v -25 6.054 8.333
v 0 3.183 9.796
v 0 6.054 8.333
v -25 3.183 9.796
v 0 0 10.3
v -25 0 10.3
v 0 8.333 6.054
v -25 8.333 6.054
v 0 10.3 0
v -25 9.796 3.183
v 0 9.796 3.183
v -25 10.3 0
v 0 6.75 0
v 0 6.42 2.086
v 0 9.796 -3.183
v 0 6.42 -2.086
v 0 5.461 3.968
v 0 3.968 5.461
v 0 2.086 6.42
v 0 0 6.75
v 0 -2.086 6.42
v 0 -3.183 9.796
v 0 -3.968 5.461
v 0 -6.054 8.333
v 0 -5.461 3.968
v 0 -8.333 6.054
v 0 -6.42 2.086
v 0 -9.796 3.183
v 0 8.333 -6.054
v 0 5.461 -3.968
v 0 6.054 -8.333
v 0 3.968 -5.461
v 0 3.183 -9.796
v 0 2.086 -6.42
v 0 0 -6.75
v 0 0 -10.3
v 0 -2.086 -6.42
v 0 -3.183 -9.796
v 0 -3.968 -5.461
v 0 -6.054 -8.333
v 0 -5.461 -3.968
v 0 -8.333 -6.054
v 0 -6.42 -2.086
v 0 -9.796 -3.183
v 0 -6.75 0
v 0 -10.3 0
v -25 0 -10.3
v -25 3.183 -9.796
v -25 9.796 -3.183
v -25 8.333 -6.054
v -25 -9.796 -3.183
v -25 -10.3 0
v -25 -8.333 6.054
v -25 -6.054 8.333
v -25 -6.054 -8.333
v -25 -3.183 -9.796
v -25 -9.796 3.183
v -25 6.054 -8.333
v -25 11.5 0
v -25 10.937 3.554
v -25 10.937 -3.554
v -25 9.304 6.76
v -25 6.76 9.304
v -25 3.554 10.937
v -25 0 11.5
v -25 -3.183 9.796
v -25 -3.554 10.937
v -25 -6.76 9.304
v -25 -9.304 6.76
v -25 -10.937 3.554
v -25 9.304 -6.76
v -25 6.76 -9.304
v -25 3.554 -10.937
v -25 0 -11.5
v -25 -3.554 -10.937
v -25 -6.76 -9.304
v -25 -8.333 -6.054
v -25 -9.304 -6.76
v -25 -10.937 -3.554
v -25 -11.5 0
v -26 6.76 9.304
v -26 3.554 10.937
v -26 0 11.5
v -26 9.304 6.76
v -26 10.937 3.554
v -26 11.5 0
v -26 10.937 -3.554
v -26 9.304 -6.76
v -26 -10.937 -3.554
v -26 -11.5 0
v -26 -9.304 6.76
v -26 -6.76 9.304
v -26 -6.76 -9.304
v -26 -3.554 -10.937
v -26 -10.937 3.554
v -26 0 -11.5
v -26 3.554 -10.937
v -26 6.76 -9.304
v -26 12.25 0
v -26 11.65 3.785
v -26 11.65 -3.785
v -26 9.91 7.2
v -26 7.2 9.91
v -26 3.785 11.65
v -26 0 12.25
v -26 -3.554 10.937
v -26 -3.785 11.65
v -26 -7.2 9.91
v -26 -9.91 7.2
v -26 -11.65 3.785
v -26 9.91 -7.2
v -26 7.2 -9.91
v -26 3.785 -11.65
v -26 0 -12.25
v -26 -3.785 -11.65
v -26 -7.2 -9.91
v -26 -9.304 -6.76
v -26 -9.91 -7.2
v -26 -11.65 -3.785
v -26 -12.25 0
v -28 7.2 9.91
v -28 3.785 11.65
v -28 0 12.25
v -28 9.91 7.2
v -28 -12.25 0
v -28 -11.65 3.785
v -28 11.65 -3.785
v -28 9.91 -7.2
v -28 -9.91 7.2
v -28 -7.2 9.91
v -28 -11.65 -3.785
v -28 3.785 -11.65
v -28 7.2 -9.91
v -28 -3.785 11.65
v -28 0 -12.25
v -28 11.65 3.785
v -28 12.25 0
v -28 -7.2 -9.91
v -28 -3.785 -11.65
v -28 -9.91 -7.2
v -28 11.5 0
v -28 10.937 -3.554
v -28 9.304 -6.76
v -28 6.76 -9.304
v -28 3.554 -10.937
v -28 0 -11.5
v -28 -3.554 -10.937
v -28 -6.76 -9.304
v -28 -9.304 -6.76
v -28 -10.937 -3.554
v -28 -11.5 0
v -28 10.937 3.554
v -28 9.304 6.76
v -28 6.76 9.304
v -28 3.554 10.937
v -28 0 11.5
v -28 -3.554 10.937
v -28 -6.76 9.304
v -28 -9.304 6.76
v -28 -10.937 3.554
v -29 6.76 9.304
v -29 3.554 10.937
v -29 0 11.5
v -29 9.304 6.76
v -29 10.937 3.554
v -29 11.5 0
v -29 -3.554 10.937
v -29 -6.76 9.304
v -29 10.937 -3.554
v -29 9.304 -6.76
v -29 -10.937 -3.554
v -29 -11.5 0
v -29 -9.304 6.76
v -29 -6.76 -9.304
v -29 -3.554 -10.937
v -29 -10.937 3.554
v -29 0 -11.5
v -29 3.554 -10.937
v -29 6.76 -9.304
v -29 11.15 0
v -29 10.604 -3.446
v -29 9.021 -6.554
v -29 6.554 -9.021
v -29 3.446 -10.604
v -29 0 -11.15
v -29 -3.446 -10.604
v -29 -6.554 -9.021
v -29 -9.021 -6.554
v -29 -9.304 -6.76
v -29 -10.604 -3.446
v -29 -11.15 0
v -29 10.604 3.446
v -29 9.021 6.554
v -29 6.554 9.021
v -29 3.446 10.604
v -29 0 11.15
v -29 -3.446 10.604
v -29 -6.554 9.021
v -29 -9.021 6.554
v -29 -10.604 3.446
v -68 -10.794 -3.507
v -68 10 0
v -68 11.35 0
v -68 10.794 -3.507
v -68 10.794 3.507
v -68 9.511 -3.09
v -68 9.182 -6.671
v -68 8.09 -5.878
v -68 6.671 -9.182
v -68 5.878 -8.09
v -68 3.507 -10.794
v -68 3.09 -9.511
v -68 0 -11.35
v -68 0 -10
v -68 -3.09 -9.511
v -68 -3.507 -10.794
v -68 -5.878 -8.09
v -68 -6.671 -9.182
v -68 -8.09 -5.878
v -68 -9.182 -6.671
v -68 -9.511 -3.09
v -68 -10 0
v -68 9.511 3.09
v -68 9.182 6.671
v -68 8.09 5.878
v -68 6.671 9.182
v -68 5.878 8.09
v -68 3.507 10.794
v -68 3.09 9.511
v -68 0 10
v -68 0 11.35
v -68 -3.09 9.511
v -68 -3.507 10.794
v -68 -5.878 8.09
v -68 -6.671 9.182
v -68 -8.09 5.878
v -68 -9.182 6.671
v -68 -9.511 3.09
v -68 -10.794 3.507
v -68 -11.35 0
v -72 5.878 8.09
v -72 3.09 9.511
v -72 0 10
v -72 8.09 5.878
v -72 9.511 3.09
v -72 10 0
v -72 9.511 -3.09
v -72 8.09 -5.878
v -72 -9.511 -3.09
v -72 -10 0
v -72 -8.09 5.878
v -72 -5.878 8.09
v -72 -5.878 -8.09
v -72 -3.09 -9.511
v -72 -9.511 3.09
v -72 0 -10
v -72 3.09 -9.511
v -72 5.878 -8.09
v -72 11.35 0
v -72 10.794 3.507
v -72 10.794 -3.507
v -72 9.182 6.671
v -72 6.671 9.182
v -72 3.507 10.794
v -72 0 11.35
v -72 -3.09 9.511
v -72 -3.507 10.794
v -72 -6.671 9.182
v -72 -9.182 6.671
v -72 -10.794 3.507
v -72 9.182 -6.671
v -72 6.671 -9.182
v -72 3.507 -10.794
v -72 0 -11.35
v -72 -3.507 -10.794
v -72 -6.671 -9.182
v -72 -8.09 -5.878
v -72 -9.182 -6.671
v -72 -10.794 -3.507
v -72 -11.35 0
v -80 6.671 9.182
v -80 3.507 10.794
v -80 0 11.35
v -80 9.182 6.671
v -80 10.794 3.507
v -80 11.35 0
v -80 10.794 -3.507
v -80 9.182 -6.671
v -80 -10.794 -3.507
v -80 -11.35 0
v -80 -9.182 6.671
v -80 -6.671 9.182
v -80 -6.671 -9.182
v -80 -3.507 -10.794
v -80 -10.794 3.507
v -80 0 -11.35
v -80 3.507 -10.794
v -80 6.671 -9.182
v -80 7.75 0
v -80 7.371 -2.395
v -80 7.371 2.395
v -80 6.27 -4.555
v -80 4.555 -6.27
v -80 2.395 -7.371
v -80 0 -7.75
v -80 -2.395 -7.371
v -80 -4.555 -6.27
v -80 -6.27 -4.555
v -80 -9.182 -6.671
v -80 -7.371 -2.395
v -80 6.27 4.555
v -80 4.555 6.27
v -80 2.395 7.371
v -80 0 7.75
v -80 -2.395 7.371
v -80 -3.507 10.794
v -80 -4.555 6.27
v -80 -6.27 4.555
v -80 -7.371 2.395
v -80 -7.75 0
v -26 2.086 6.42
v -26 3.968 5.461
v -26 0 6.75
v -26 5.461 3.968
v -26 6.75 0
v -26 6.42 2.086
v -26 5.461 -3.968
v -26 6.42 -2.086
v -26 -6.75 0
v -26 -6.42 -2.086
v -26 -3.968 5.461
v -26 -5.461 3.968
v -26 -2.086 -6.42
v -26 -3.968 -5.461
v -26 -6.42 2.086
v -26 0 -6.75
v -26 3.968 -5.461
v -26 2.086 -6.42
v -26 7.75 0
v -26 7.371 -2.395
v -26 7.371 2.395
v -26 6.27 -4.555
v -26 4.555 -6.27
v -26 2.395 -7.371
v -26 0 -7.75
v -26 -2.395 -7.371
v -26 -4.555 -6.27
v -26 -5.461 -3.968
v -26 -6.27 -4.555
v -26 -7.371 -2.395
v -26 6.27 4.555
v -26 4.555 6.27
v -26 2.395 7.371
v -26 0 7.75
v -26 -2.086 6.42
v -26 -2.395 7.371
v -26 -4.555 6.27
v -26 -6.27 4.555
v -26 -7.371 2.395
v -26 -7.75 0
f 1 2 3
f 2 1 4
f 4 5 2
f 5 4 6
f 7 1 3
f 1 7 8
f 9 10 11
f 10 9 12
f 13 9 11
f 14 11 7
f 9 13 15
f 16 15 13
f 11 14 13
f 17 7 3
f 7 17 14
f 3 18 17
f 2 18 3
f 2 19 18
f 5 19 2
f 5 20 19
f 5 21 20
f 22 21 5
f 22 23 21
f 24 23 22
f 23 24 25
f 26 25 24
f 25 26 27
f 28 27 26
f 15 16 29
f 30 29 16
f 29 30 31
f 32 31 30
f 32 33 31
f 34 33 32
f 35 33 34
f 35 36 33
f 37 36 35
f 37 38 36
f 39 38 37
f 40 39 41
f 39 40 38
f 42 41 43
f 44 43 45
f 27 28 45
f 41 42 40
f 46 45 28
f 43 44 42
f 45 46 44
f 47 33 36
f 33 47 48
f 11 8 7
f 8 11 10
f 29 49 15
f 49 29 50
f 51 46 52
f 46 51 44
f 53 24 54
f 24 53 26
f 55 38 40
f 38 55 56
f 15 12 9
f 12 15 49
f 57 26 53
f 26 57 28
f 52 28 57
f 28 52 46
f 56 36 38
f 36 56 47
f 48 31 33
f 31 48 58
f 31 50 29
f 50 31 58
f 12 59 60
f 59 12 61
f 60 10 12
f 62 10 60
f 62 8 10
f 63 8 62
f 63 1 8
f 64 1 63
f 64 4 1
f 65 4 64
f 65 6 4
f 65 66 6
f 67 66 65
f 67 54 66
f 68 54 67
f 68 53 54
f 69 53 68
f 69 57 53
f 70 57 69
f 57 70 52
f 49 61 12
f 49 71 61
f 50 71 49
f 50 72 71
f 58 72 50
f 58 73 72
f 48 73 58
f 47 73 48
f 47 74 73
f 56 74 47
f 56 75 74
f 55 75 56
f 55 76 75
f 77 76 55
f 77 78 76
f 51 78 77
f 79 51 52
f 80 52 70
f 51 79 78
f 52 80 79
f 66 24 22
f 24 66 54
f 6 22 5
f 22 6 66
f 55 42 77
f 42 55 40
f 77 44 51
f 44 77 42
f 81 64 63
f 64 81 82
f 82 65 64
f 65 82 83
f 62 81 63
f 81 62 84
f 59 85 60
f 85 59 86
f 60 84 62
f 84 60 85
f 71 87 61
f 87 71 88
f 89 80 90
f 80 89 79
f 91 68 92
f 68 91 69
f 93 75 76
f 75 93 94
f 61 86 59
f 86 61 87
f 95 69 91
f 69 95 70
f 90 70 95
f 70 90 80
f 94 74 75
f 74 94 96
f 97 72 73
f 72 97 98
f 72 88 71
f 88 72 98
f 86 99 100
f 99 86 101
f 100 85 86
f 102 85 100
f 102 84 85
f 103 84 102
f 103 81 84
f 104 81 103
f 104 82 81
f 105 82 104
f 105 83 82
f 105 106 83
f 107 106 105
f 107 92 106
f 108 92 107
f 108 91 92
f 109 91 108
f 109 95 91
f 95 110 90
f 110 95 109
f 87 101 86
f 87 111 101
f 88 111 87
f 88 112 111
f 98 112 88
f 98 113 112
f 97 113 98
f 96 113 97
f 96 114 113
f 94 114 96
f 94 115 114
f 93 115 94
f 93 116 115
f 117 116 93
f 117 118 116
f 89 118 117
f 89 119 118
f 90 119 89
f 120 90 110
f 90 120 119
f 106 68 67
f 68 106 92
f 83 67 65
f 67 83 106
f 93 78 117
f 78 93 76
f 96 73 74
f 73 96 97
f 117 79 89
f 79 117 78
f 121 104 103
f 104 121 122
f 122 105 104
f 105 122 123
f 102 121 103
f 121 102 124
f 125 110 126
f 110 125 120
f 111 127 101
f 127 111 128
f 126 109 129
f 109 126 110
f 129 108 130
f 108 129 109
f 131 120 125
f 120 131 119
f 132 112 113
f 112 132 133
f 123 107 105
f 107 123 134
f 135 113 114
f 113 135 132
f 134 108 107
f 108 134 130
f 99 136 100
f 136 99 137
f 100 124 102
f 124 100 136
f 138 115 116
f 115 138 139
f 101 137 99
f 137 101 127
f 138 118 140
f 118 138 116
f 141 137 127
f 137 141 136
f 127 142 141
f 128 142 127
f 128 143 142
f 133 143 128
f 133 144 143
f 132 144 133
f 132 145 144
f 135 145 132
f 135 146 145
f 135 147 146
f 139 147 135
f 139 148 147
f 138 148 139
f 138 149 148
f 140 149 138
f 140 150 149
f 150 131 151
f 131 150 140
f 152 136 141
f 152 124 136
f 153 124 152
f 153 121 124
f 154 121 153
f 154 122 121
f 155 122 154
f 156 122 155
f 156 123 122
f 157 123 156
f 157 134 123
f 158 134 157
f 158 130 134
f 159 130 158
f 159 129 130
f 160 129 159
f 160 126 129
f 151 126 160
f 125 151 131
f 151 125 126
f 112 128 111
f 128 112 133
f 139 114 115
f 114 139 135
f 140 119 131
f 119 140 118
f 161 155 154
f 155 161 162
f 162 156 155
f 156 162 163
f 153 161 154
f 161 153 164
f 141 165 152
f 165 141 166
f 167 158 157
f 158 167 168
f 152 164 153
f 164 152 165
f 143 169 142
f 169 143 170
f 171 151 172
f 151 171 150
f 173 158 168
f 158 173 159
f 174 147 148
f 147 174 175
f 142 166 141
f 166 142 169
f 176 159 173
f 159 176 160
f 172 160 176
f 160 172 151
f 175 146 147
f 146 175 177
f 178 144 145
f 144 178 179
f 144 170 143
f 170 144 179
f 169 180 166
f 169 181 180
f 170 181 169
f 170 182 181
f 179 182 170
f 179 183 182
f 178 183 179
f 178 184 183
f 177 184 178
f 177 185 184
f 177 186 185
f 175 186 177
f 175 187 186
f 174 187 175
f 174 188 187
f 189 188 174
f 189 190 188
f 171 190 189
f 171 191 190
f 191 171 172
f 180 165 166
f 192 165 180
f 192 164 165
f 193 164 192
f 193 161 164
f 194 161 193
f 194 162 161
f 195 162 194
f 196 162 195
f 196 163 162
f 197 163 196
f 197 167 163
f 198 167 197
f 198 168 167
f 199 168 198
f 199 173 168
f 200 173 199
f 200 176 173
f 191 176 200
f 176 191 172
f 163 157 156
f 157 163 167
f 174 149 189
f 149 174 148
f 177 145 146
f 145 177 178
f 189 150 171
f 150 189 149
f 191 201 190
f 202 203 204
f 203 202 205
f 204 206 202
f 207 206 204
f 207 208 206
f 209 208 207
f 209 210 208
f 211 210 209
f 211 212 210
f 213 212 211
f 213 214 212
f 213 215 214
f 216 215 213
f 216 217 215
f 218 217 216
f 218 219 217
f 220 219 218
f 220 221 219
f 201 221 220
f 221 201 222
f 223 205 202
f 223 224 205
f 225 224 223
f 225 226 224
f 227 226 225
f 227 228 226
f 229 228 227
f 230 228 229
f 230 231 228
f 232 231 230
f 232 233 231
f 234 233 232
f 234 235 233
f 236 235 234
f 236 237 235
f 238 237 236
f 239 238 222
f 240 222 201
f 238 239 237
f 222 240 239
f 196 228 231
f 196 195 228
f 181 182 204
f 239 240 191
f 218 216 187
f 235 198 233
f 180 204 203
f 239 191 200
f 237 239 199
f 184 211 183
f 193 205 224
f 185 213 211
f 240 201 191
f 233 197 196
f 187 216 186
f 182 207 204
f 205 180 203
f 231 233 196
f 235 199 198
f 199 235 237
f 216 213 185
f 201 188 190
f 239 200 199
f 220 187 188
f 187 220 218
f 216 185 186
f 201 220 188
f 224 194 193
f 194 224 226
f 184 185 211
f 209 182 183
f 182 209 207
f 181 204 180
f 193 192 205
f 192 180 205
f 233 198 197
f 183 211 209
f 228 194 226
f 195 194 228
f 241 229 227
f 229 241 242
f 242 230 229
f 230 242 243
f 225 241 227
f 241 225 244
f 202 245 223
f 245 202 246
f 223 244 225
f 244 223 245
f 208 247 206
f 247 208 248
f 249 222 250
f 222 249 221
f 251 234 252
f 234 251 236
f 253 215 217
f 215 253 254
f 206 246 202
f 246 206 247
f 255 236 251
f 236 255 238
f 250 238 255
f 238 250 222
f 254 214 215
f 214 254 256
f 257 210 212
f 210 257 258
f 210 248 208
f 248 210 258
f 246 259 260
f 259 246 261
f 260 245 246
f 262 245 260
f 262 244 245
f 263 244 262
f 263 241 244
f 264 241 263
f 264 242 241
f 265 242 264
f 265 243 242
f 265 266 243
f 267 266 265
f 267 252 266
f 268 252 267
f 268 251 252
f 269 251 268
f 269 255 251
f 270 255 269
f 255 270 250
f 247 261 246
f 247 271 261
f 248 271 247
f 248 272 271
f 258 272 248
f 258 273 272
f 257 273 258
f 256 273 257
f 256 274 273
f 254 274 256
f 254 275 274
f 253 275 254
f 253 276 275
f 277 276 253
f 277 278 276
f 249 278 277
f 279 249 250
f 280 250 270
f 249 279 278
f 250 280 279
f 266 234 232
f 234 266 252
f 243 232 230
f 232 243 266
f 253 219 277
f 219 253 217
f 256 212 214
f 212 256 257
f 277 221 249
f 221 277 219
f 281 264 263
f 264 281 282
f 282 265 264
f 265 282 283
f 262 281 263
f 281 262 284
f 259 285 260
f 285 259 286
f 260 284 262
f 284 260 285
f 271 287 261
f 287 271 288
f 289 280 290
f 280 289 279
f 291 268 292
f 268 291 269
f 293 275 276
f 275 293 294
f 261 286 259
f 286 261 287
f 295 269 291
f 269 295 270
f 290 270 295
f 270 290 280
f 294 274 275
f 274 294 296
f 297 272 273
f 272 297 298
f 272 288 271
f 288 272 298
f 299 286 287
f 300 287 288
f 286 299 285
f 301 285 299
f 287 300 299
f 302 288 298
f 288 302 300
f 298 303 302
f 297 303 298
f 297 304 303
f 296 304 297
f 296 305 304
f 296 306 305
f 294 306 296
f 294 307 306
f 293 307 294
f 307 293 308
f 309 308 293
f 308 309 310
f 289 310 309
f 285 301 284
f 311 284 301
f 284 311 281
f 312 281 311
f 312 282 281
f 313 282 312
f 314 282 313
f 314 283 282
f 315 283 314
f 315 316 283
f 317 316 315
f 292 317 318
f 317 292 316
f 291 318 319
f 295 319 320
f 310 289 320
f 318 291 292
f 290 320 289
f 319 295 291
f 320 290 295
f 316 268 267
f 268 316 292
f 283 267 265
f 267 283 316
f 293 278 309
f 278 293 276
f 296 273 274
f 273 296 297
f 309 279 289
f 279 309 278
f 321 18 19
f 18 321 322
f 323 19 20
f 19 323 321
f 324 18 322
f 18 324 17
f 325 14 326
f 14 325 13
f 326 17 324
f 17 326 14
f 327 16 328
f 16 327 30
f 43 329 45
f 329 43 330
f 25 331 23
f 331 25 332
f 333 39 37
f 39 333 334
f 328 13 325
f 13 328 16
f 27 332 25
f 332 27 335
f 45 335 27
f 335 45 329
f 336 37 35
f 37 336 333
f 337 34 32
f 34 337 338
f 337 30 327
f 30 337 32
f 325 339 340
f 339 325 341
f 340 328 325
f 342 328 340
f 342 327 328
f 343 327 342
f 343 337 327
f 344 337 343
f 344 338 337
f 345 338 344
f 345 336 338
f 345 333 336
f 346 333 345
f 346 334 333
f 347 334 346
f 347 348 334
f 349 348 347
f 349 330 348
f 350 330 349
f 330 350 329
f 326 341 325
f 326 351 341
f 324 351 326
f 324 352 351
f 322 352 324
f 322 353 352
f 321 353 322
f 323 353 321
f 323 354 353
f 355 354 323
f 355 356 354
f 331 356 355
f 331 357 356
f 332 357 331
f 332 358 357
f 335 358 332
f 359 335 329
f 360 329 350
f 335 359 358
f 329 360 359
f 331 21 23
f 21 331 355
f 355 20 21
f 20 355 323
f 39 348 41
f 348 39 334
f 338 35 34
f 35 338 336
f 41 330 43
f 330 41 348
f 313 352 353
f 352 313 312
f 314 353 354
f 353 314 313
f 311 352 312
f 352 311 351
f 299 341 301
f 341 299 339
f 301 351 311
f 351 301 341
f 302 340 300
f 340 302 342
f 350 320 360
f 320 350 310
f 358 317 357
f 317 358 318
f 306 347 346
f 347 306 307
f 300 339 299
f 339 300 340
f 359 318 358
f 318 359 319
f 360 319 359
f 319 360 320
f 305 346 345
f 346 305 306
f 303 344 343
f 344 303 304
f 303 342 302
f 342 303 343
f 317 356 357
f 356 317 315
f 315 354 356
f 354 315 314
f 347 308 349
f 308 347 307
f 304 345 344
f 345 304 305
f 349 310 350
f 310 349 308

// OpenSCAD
// openNSP_project, chanter and blowpipe stock version 1.1
// Zexuan Qiao, 2024
// under GPL license ver3

stockLOA = 80; //.1

ferruleWood = 25; //.1
ferruleWoodDiameter = 20.6; //.1

decoration1 = 1; //.1
decoration2 = 2; //.1
decoration3 = 1; //.1
decoration1Diameter = 23; //.1
decoration2Diameter = 24.5; //.1
decoration3Diameter = 23; //.1

mainDiameter1 = 22.3; //.1
mainDiameter2 = 22.7; //.1

groove = 4; //.1
grooveDiameter = 20; //.1

bagEnd = 8; //.1

boreDiameter1 = 15.5; //.1
tenon = 26; //.1
boreDiameter2 = 13.5; //.1

main = stockLOA-ferruleWood-decoration1-decoration2-decoration3-groove-bagEnd;

/* [Utilities] */
// Segments, the higher the value, the smoother the surface would be.
$fn = 20;

rotate([0,-90,0]) difference(){
union(){
cylinder(h = ferruleWood, d = ferruleWoodDiameter);
translate([0,0,ferruleWood]) cylinder(h = decoration1, d = decoration1Diameter);
translate([0,0,ferruleWood+decoration1]) cylinder(h = decoration2, d = decoration2Diameter);
translate([0,0,ferruleWood+decoration1+decoration2])cylinder(h = decoration3, d = decoration3Diameter);
translate([0,0,ferruleWood+decoration1+decoration2+decoration3]) cylinder(h = main, d1 = mainDiameter1, d2 = mainDiameter2);
translate([0,0,ferruleWood+decoration1+decoration2+decoration3+main]) cylinder(h = groove, d = grooveDiameter);
translate([0,0,ferruleWood+decoration1+decoration2+decoration3+main+groove]) cylinder(h = bagEnd, d = mainDiameter2);
}
translate([0,0,0]) cylinder(h = tenon, d = boreDiameter2);
translate([0,0,tenon]) cylinder(h = stockLOA-tenon, d = boreDiameter1);
}
